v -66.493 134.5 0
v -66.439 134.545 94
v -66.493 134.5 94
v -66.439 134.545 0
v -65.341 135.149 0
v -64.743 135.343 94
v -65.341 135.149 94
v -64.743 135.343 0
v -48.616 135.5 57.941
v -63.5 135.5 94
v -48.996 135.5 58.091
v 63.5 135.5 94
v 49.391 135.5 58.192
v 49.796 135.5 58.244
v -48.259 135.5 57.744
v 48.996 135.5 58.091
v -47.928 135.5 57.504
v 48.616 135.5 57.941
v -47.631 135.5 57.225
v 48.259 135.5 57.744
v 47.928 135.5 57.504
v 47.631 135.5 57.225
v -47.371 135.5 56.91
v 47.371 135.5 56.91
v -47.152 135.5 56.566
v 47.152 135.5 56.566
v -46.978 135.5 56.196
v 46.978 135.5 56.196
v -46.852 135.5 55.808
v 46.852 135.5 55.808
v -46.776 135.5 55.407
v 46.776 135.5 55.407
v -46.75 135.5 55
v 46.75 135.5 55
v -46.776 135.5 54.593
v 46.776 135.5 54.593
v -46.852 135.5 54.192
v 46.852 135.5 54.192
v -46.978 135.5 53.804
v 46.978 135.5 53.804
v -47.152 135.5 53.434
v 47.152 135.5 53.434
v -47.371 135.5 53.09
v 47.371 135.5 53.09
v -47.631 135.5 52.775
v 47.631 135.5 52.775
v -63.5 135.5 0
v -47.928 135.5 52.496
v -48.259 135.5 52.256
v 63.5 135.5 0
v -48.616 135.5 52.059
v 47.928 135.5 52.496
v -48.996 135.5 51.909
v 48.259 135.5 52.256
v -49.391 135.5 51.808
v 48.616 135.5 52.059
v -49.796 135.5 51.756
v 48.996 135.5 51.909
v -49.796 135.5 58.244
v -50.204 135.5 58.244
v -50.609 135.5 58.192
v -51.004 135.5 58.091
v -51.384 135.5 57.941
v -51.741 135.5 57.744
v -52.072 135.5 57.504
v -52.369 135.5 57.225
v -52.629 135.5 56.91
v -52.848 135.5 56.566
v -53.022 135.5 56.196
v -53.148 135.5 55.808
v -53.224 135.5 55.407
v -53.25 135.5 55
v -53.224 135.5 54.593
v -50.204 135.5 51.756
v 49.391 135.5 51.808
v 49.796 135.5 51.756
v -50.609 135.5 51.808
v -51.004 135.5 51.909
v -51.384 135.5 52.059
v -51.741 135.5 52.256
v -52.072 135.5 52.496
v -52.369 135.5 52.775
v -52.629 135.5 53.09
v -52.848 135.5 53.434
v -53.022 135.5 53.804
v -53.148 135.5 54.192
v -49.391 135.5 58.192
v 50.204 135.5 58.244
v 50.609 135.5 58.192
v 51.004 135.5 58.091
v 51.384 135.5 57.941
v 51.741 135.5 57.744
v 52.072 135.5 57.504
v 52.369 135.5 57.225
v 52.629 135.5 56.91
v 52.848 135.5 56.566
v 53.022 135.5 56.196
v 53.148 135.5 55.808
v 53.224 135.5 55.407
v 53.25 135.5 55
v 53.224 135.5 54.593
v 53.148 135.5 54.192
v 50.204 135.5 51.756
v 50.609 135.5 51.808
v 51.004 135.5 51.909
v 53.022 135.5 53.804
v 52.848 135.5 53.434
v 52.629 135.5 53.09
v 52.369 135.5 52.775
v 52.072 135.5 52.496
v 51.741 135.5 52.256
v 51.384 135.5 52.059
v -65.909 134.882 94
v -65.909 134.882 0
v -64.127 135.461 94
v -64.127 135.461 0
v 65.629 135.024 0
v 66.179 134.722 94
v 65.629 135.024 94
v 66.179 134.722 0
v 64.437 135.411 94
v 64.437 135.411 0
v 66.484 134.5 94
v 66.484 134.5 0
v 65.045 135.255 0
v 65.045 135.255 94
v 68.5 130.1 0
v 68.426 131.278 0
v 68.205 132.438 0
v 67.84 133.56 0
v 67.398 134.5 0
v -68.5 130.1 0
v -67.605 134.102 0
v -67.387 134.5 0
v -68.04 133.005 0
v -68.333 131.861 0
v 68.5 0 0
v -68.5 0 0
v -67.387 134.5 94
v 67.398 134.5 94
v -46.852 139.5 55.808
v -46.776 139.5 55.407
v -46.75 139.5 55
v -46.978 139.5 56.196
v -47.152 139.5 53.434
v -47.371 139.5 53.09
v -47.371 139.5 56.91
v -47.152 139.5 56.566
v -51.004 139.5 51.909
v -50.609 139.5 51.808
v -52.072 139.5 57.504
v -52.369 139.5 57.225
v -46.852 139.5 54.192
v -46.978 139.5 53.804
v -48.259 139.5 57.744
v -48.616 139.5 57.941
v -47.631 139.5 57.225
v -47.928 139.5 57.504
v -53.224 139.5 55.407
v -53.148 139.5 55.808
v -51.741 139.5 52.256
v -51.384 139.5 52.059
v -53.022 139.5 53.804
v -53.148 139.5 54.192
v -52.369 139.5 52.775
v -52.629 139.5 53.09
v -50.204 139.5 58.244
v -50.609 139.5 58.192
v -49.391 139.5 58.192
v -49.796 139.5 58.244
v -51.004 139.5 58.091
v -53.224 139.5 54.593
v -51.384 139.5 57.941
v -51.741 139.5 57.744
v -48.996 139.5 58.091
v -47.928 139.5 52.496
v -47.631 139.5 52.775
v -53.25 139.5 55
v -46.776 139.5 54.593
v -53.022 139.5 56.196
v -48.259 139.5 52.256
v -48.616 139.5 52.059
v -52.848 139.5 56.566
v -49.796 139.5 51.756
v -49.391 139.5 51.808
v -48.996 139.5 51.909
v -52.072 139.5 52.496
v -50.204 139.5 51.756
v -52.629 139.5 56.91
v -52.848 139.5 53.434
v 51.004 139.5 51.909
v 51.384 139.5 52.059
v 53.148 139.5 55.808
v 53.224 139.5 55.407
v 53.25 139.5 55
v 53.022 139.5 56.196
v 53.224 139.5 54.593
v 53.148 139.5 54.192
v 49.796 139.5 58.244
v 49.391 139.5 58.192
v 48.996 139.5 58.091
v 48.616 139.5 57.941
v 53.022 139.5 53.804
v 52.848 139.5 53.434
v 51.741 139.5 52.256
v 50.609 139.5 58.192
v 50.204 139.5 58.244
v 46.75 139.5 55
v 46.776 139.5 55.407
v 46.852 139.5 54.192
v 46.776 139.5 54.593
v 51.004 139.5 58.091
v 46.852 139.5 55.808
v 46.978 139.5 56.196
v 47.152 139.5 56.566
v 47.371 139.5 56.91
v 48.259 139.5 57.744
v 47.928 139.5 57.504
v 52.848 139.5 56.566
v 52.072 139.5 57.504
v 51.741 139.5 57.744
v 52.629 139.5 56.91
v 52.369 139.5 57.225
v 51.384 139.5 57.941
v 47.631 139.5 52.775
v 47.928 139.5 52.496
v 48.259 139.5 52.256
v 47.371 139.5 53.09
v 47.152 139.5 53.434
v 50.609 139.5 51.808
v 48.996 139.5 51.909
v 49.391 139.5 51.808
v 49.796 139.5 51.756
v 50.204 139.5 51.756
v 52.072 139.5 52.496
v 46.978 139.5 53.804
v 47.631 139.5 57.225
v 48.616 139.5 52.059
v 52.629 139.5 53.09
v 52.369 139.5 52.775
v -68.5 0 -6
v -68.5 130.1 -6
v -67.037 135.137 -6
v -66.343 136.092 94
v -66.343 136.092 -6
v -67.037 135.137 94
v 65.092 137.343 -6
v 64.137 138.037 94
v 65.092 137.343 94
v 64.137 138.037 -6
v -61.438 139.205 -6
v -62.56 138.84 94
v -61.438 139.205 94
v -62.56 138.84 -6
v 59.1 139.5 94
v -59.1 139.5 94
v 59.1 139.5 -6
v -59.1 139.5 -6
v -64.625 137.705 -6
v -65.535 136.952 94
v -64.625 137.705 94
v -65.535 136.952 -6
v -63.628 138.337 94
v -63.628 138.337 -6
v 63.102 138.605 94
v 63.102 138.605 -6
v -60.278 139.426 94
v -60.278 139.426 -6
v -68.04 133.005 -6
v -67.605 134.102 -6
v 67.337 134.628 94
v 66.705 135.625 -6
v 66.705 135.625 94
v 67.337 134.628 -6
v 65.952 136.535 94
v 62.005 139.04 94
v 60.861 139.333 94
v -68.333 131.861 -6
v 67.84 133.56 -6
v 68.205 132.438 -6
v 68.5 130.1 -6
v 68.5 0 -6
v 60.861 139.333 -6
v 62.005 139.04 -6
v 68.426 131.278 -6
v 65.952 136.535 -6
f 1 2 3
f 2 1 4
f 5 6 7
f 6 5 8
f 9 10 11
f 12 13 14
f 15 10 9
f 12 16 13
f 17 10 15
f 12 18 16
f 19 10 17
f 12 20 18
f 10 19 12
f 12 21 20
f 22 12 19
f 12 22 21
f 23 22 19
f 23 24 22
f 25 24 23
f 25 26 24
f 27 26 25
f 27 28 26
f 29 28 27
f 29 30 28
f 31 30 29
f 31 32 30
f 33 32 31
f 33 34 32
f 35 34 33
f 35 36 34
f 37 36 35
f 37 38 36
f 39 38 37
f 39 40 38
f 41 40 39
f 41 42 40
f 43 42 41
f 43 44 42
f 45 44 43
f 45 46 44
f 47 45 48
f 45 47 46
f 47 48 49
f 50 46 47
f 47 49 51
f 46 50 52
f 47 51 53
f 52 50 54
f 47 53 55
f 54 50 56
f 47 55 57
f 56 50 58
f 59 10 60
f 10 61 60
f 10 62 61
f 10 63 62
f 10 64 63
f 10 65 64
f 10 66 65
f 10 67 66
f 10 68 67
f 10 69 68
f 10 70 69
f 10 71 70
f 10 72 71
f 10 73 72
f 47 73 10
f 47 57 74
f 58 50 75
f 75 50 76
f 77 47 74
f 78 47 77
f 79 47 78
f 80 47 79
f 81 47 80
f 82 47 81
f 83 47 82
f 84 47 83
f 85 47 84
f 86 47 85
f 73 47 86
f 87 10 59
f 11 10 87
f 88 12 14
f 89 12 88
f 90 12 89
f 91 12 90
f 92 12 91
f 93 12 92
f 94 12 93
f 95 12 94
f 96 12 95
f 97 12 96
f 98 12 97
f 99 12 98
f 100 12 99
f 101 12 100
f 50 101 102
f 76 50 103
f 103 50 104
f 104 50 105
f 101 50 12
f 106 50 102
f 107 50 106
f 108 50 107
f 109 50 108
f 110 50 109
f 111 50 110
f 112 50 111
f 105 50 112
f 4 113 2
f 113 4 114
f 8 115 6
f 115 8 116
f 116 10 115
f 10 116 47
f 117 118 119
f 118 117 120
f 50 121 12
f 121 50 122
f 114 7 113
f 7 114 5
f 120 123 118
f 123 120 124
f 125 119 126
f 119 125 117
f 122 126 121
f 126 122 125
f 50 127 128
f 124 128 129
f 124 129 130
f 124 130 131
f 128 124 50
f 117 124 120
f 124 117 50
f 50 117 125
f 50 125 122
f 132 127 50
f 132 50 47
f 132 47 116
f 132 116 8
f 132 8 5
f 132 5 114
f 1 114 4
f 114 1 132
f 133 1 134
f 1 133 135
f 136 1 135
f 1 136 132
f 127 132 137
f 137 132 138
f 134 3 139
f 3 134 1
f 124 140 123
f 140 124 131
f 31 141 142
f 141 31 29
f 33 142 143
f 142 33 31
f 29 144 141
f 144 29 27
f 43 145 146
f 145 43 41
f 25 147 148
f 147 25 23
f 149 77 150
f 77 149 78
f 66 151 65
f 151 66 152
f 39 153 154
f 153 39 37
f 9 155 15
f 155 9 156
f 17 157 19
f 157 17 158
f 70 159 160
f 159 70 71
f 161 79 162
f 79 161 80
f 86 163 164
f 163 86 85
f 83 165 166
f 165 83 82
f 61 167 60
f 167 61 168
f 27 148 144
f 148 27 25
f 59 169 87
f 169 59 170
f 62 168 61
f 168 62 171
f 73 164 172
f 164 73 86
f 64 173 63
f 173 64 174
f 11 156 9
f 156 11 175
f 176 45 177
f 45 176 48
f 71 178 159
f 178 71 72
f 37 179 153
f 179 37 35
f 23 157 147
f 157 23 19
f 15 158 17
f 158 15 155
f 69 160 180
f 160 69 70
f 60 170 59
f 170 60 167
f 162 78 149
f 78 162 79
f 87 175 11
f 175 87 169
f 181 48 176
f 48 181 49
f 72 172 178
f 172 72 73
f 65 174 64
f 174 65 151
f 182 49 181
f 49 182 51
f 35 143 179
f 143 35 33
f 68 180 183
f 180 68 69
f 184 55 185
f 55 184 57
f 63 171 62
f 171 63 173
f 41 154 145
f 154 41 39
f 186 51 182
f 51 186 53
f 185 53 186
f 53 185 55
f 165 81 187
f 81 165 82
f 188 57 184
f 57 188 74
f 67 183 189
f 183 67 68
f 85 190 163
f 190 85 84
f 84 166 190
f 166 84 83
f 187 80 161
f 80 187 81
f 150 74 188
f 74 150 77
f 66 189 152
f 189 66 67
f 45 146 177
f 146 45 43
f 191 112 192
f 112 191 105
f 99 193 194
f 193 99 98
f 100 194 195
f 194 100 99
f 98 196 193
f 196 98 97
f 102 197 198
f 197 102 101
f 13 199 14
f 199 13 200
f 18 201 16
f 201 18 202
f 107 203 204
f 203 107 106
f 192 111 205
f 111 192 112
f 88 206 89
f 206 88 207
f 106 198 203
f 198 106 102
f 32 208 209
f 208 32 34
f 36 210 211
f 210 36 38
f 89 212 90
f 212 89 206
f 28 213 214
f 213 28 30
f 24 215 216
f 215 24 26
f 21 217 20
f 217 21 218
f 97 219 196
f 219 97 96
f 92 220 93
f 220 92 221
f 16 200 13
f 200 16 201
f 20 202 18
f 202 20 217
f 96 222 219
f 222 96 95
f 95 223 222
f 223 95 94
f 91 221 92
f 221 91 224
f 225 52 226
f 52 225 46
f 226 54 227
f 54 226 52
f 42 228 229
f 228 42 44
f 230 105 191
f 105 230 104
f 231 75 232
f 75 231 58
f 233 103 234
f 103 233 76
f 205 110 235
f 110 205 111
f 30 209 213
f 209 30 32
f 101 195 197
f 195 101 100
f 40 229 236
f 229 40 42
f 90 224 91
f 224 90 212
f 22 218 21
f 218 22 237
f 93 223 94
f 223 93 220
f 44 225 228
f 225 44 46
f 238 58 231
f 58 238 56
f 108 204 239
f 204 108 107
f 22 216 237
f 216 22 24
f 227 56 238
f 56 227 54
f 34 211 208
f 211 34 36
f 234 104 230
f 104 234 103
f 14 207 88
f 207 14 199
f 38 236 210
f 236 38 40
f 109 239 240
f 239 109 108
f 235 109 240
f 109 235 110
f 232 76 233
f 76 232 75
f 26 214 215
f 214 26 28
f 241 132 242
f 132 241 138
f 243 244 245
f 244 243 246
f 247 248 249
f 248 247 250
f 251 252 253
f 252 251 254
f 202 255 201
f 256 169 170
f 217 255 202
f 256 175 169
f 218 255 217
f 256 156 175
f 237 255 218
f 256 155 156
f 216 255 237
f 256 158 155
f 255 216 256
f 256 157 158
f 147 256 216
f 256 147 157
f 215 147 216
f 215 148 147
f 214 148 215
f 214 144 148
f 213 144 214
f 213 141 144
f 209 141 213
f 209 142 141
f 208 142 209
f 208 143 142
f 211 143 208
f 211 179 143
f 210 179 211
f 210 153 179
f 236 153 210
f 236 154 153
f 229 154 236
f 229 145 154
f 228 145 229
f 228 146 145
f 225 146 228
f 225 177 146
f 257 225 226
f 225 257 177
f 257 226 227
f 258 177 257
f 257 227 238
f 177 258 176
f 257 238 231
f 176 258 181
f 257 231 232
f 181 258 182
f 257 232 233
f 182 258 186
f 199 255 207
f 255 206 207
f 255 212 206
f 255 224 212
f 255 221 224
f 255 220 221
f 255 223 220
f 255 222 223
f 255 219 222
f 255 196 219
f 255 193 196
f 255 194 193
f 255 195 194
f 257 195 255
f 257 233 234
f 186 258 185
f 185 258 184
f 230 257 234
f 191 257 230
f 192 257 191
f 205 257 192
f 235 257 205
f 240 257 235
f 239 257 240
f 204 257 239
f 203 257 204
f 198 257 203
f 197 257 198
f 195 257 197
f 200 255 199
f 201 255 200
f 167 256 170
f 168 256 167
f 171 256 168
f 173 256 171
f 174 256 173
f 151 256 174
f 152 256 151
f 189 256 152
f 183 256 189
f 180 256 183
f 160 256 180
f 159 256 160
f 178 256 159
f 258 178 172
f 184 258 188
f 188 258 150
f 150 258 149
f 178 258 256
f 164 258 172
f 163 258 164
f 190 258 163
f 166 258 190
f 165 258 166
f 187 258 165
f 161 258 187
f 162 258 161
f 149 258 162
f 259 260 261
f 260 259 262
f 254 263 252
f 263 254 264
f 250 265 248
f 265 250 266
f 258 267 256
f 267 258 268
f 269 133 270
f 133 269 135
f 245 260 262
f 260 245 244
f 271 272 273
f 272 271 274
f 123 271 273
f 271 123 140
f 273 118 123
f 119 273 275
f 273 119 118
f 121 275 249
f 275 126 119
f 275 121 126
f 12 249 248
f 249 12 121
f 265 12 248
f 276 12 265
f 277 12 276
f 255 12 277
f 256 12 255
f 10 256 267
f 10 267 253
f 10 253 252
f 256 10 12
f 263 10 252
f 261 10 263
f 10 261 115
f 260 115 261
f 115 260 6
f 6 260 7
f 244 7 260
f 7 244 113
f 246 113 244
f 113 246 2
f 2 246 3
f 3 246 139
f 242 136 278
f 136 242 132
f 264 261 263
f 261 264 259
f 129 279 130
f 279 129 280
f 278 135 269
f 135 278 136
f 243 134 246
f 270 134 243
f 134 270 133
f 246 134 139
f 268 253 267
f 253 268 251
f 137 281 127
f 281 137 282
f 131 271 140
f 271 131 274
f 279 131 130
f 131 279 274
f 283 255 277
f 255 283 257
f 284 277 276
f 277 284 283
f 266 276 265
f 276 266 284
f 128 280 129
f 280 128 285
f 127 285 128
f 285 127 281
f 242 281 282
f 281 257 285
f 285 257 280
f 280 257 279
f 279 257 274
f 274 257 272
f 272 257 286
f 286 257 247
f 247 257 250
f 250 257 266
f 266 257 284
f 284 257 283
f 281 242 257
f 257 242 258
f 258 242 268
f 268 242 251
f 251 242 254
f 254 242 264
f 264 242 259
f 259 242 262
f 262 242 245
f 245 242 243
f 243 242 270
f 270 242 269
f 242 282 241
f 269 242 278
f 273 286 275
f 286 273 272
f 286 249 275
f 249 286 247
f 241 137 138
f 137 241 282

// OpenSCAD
wall = 2.0;

part = "top"; // top, bot

adapter_thickness = 4;
fan_thickness = 45;
adapter_face_thickness = 6;

hepa_corner_d = 10;
hepa_h = 58 + fan_thickness;
hepa_w = 133 + 2*wall;
hepa_l = 267 + 2*wall;

cover_thickness = 1.2;
cover_corner_d = 20 - cover_thickness;
cover_h = hepa_h + adapter_face_thickness;
cover_w = hepa_w;
cover_l = hepa_l + 2 * adapter_thickness;

side_mount_d = 6.5;
side_mount_spacing = 100;
side_mount_edge_offset = 10 + fan_thickness;


$fn = 50;

module rounded_rect(w, l, h, d) {
  linear_extrude(h = h)
  offset(r=d/2)
  square([w - d, l - d], center=true);
}

module side_mount_holes() {
  for (i = [-1, 1])
    translate([i * side_mount_spacing/2, cover_l/2 + 5, side_mount_edge_offset])
    rotate([90, 0, 0])
    cylinder(d=side_mount_d, h=cover_l + 10);
}

module hepa() {
  rounded_rect(hepa_w, hepa_l, hepa_h, hepa_corner_d);
  rounded_rect(hepa_w + 10, hepa_l - 2, hepa_h, hepa_corner_d);
}

module adapter() {
  difference() {
    translate([0, 0, -adapter_face_thickness])
    rounded_rect(cover_w, cover_l, cover_h, cover_corner_d);
    #hepa();
    #side_mount_holes();
  }
}

module split_keep(which="top") {
    // Large clipping boxes. The gap is only for preview/clearance at the seam.
    if (which == "top") {
        translate([-500, 0, -50]) cube([1000, 1000, 300], center=false);
    } else if (which == "bot") {
        translate([-500, -1000 - 0, -50]) cube([1000, 1000, 300], center=false);
    }
}


intersection() {
  adapter();
  split_keep(part);
}
